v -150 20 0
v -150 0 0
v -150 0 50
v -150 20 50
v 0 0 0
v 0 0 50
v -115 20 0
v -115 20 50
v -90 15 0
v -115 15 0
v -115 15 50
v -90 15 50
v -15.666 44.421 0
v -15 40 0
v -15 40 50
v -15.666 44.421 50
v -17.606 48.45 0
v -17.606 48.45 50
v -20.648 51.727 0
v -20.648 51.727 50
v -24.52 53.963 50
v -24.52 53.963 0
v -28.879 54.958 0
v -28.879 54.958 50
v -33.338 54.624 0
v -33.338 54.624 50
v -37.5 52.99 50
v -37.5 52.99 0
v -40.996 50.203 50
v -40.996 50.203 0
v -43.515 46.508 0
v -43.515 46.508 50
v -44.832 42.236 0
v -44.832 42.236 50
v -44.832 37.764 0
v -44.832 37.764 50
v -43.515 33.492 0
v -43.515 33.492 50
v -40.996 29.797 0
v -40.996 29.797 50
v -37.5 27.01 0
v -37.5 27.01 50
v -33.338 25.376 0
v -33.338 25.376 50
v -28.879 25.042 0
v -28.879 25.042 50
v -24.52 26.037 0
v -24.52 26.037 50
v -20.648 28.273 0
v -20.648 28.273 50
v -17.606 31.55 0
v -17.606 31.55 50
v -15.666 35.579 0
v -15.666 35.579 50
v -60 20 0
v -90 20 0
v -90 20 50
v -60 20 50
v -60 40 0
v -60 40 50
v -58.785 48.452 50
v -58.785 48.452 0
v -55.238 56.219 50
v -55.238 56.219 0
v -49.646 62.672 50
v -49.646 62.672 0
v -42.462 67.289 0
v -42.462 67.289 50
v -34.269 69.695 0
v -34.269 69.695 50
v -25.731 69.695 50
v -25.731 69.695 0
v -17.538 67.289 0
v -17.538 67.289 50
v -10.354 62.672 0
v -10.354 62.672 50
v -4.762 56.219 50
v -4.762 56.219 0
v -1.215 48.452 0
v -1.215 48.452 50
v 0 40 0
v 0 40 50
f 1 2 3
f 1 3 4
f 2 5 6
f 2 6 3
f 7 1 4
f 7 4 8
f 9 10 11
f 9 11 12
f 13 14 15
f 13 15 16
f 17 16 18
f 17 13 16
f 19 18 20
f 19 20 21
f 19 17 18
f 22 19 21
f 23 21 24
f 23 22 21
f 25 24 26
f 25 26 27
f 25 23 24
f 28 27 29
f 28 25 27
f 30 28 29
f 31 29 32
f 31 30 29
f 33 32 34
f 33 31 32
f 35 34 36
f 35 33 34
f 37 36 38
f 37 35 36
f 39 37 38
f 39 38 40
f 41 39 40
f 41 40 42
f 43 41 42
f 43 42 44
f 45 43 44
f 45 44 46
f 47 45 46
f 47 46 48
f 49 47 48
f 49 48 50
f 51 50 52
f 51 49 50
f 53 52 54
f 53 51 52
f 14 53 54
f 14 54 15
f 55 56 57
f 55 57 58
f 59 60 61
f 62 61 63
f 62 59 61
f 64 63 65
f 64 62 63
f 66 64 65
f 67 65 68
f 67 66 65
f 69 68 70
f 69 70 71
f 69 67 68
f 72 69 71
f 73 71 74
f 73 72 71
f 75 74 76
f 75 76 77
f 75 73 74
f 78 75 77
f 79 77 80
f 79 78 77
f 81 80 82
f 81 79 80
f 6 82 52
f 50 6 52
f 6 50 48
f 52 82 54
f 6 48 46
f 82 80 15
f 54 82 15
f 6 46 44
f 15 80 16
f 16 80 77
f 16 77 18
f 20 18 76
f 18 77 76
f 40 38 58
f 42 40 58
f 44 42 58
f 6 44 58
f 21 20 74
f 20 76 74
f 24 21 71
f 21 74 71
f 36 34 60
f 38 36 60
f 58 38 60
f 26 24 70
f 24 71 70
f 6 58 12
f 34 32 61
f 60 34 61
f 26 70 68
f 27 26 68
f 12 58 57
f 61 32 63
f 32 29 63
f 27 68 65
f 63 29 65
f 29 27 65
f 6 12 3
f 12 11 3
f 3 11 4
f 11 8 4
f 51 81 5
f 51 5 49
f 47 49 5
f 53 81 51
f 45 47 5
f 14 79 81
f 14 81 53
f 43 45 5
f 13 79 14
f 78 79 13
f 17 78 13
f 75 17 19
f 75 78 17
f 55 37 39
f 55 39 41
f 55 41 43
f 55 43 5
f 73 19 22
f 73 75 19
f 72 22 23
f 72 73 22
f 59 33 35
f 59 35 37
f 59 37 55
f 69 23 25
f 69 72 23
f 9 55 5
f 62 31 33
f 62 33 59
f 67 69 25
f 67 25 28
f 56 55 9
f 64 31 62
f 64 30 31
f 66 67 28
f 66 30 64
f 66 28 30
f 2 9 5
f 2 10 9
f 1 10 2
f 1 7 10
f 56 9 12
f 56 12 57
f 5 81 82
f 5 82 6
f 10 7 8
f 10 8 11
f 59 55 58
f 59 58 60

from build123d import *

# Parameters (mm, degrees)
SKETCH1_R           = 15
BOSS_EXTRUDE1_DEPTH = 50


with BuildPart() as part:
    # Sketch1 → Boss-Extrude1 (new body)
    with BuildSketch(Plane.XY):
        with BuildLine():
            ThreePointArc((-60, 40), (-30, 70), (0, 40))
            Line((0, 40), (0, 0))
            Line((0, 0), (-150, 0))
            Line((-150, 0), (-150, 20))
            Line((-150, 20), (-115, 20))
            Line((-115, 20), (-115, 15))
            Line((-115, 15), (-90, 15))
            Line((-90, 15), (-90, 20))
            Line((-90, 20), (-60, 20))
            Line((-60, 20), (-60, 40))
        make_face()
        with Locations((-30, 40)):
            Circle(SKETCH1_R, mode=Mode.SUBTRACT)
    extrude(amount=BOSS_EXTRUDE1_DEPTH)


solid = part.part
